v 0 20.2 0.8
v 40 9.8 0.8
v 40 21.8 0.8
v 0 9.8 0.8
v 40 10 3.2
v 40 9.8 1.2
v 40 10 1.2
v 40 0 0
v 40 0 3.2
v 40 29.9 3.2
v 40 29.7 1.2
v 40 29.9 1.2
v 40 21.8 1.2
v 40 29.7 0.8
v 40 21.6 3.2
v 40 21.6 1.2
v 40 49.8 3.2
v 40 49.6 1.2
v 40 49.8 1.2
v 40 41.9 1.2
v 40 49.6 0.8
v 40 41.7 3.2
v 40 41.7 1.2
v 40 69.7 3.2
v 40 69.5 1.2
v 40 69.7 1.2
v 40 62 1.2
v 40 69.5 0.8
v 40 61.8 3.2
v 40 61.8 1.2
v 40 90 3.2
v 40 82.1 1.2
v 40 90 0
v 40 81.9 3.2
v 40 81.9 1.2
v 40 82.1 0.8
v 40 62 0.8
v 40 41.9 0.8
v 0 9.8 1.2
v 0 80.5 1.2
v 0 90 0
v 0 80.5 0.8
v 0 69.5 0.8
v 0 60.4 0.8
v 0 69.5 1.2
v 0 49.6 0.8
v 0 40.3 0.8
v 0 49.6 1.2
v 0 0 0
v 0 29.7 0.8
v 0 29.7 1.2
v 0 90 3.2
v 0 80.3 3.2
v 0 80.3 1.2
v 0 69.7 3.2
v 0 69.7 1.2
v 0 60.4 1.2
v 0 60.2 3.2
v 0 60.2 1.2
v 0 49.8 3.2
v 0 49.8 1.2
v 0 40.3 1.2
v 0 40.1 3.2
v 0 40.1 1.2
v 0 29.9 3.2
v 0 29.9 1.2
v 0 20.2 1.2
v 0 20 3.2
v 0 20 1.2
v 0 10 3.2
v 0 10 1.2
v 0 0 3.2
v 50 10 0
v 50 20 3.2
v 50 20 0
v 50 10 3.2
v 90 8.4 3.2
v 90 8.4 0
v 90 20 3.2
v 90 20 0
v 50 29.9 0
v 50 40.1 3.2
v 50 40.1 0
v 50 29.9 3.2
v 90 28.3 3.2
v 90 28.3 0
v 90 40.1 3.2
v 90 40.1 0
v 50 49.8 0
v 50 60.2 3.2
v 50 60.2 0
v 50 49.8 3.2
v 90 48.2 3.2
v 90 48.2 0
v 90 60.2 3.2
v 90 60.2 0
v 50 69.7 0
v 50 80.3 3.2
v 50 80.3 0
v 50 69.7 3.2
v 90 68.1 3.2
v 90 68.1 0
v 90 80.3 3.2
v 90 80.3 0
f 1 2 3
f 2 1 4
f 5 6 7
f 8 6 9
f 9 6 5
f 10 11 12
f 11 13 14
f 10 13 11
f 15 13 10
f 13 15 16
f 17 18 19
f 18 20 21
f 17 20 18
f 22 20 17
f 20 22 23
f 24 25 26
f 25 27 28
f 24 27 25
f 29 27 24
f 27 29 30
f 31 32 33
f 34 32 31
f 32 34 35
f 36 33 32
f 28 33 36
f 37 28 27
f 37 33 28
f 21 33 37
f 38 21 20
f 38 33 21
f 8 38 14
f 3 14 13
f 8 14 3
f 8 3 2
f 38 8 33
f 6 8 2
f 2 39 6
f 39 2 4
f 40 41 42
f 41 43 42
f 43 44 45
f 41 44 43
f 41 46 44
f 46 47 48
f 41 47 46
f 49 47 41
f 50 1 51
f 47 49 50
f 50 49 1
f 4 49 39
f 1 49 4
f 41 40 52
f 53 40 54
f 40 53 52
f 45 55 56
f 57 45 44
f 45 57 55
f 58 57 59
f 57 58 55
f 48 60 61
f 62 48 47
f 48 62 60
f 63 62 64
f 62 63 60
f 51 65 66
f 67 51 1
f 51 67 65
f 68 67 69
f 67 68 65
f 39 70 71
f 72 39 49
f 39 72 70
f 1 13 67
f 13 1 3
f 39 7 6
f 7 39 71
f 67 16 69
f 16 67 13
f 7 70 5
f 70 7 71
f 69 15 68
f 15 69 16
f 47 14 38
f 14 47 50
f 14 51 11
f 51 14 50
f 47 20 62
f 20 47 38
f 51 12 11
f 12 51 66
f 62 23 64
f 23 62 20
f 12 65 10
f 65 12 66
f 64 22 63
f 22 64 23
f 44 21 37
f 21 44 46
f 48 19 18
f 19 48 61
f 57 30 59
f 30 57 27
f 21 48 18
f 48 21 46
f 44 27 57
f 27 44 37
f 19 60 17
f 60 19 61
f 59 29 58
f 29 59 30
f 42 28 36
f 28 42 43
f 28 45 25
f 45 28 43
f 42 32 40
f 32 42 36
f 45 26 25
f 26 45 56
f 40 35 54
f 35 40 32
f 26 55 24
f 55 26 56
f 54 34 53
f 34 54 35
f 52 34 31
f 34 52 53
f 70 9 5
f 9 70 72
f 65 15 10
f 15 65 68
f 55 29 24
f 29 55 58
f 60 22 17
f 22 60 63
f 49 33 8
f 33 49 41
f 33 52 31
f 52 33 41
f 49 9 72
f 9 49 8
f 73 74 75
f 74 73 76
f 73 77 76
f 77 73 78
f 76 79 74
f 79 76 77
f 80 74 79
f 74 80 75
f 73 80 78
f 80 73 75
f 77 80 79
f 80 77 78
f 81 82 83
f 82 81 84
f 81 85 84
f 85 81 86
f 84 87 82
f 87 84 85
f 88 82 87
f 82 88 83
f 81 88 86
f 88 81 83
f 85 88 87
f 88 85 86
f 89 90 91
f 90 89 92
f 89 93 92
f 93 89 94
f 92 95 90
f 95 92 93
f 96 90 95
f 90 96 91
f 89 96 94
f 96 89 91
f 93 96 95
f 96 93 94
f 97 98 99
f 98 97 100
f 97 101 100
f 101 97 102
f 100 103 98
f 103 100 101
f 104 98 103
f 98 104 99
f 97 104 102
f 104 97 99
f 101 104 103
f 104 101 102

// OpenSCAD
// Number of test strips to print (for averaging)
strips = 4; // [1:4]

/* [hidden] */

// Height of the strips
height = 3.2; // [3.2, 6.4]

a = 40; // Block length
b = 10; // Block spacings
d = a/25; // Taper amount (1 in 100 slope, divided by 4 surfaces)
e = 0.2; // Undercut width
f = 0.4; // Undercut height
i = 0.1; // Test strip increments

difference () {
    cube([a,b*(strips*2 + 1),height]);
    for (x=[0:strips-1]) {
        wedge = [[0,0],[0,b],[a,b+d],[a,0],[0,0]];
        adjusted_wedge = wedge + [[0,-i*x],[0,i*x],[0,i*x],[0,-i*x],[0,-i*x]];
        undercut_wedge = adjusted_wedge + [[0,-e],[0,e],[0,e],[0,-e],[0,-e]];
        translate([0,(2*x + 1)*b,height/4]) {
            linear_extrude(height=f) {
                polygon(undercut_wedge);
            };
            linear_extrude(height=height) {
                polygon(adjusted_wedge);
            };
        };
    };
}

for (x=[0:strips - 1]) {
    wedge = [[0,0],[0,b],[a,b],[a,-d],[0,0]];
    adjusted_wedge = wedge + [[0,-i*x],[0,i*x],[0,i*x],[0,-i*x],[0,-i*x]];
    translate ([a+10,(1 + 2*x)*b,0]) linear_extrude(height=height) polygon(adjusted_wedge);
}
